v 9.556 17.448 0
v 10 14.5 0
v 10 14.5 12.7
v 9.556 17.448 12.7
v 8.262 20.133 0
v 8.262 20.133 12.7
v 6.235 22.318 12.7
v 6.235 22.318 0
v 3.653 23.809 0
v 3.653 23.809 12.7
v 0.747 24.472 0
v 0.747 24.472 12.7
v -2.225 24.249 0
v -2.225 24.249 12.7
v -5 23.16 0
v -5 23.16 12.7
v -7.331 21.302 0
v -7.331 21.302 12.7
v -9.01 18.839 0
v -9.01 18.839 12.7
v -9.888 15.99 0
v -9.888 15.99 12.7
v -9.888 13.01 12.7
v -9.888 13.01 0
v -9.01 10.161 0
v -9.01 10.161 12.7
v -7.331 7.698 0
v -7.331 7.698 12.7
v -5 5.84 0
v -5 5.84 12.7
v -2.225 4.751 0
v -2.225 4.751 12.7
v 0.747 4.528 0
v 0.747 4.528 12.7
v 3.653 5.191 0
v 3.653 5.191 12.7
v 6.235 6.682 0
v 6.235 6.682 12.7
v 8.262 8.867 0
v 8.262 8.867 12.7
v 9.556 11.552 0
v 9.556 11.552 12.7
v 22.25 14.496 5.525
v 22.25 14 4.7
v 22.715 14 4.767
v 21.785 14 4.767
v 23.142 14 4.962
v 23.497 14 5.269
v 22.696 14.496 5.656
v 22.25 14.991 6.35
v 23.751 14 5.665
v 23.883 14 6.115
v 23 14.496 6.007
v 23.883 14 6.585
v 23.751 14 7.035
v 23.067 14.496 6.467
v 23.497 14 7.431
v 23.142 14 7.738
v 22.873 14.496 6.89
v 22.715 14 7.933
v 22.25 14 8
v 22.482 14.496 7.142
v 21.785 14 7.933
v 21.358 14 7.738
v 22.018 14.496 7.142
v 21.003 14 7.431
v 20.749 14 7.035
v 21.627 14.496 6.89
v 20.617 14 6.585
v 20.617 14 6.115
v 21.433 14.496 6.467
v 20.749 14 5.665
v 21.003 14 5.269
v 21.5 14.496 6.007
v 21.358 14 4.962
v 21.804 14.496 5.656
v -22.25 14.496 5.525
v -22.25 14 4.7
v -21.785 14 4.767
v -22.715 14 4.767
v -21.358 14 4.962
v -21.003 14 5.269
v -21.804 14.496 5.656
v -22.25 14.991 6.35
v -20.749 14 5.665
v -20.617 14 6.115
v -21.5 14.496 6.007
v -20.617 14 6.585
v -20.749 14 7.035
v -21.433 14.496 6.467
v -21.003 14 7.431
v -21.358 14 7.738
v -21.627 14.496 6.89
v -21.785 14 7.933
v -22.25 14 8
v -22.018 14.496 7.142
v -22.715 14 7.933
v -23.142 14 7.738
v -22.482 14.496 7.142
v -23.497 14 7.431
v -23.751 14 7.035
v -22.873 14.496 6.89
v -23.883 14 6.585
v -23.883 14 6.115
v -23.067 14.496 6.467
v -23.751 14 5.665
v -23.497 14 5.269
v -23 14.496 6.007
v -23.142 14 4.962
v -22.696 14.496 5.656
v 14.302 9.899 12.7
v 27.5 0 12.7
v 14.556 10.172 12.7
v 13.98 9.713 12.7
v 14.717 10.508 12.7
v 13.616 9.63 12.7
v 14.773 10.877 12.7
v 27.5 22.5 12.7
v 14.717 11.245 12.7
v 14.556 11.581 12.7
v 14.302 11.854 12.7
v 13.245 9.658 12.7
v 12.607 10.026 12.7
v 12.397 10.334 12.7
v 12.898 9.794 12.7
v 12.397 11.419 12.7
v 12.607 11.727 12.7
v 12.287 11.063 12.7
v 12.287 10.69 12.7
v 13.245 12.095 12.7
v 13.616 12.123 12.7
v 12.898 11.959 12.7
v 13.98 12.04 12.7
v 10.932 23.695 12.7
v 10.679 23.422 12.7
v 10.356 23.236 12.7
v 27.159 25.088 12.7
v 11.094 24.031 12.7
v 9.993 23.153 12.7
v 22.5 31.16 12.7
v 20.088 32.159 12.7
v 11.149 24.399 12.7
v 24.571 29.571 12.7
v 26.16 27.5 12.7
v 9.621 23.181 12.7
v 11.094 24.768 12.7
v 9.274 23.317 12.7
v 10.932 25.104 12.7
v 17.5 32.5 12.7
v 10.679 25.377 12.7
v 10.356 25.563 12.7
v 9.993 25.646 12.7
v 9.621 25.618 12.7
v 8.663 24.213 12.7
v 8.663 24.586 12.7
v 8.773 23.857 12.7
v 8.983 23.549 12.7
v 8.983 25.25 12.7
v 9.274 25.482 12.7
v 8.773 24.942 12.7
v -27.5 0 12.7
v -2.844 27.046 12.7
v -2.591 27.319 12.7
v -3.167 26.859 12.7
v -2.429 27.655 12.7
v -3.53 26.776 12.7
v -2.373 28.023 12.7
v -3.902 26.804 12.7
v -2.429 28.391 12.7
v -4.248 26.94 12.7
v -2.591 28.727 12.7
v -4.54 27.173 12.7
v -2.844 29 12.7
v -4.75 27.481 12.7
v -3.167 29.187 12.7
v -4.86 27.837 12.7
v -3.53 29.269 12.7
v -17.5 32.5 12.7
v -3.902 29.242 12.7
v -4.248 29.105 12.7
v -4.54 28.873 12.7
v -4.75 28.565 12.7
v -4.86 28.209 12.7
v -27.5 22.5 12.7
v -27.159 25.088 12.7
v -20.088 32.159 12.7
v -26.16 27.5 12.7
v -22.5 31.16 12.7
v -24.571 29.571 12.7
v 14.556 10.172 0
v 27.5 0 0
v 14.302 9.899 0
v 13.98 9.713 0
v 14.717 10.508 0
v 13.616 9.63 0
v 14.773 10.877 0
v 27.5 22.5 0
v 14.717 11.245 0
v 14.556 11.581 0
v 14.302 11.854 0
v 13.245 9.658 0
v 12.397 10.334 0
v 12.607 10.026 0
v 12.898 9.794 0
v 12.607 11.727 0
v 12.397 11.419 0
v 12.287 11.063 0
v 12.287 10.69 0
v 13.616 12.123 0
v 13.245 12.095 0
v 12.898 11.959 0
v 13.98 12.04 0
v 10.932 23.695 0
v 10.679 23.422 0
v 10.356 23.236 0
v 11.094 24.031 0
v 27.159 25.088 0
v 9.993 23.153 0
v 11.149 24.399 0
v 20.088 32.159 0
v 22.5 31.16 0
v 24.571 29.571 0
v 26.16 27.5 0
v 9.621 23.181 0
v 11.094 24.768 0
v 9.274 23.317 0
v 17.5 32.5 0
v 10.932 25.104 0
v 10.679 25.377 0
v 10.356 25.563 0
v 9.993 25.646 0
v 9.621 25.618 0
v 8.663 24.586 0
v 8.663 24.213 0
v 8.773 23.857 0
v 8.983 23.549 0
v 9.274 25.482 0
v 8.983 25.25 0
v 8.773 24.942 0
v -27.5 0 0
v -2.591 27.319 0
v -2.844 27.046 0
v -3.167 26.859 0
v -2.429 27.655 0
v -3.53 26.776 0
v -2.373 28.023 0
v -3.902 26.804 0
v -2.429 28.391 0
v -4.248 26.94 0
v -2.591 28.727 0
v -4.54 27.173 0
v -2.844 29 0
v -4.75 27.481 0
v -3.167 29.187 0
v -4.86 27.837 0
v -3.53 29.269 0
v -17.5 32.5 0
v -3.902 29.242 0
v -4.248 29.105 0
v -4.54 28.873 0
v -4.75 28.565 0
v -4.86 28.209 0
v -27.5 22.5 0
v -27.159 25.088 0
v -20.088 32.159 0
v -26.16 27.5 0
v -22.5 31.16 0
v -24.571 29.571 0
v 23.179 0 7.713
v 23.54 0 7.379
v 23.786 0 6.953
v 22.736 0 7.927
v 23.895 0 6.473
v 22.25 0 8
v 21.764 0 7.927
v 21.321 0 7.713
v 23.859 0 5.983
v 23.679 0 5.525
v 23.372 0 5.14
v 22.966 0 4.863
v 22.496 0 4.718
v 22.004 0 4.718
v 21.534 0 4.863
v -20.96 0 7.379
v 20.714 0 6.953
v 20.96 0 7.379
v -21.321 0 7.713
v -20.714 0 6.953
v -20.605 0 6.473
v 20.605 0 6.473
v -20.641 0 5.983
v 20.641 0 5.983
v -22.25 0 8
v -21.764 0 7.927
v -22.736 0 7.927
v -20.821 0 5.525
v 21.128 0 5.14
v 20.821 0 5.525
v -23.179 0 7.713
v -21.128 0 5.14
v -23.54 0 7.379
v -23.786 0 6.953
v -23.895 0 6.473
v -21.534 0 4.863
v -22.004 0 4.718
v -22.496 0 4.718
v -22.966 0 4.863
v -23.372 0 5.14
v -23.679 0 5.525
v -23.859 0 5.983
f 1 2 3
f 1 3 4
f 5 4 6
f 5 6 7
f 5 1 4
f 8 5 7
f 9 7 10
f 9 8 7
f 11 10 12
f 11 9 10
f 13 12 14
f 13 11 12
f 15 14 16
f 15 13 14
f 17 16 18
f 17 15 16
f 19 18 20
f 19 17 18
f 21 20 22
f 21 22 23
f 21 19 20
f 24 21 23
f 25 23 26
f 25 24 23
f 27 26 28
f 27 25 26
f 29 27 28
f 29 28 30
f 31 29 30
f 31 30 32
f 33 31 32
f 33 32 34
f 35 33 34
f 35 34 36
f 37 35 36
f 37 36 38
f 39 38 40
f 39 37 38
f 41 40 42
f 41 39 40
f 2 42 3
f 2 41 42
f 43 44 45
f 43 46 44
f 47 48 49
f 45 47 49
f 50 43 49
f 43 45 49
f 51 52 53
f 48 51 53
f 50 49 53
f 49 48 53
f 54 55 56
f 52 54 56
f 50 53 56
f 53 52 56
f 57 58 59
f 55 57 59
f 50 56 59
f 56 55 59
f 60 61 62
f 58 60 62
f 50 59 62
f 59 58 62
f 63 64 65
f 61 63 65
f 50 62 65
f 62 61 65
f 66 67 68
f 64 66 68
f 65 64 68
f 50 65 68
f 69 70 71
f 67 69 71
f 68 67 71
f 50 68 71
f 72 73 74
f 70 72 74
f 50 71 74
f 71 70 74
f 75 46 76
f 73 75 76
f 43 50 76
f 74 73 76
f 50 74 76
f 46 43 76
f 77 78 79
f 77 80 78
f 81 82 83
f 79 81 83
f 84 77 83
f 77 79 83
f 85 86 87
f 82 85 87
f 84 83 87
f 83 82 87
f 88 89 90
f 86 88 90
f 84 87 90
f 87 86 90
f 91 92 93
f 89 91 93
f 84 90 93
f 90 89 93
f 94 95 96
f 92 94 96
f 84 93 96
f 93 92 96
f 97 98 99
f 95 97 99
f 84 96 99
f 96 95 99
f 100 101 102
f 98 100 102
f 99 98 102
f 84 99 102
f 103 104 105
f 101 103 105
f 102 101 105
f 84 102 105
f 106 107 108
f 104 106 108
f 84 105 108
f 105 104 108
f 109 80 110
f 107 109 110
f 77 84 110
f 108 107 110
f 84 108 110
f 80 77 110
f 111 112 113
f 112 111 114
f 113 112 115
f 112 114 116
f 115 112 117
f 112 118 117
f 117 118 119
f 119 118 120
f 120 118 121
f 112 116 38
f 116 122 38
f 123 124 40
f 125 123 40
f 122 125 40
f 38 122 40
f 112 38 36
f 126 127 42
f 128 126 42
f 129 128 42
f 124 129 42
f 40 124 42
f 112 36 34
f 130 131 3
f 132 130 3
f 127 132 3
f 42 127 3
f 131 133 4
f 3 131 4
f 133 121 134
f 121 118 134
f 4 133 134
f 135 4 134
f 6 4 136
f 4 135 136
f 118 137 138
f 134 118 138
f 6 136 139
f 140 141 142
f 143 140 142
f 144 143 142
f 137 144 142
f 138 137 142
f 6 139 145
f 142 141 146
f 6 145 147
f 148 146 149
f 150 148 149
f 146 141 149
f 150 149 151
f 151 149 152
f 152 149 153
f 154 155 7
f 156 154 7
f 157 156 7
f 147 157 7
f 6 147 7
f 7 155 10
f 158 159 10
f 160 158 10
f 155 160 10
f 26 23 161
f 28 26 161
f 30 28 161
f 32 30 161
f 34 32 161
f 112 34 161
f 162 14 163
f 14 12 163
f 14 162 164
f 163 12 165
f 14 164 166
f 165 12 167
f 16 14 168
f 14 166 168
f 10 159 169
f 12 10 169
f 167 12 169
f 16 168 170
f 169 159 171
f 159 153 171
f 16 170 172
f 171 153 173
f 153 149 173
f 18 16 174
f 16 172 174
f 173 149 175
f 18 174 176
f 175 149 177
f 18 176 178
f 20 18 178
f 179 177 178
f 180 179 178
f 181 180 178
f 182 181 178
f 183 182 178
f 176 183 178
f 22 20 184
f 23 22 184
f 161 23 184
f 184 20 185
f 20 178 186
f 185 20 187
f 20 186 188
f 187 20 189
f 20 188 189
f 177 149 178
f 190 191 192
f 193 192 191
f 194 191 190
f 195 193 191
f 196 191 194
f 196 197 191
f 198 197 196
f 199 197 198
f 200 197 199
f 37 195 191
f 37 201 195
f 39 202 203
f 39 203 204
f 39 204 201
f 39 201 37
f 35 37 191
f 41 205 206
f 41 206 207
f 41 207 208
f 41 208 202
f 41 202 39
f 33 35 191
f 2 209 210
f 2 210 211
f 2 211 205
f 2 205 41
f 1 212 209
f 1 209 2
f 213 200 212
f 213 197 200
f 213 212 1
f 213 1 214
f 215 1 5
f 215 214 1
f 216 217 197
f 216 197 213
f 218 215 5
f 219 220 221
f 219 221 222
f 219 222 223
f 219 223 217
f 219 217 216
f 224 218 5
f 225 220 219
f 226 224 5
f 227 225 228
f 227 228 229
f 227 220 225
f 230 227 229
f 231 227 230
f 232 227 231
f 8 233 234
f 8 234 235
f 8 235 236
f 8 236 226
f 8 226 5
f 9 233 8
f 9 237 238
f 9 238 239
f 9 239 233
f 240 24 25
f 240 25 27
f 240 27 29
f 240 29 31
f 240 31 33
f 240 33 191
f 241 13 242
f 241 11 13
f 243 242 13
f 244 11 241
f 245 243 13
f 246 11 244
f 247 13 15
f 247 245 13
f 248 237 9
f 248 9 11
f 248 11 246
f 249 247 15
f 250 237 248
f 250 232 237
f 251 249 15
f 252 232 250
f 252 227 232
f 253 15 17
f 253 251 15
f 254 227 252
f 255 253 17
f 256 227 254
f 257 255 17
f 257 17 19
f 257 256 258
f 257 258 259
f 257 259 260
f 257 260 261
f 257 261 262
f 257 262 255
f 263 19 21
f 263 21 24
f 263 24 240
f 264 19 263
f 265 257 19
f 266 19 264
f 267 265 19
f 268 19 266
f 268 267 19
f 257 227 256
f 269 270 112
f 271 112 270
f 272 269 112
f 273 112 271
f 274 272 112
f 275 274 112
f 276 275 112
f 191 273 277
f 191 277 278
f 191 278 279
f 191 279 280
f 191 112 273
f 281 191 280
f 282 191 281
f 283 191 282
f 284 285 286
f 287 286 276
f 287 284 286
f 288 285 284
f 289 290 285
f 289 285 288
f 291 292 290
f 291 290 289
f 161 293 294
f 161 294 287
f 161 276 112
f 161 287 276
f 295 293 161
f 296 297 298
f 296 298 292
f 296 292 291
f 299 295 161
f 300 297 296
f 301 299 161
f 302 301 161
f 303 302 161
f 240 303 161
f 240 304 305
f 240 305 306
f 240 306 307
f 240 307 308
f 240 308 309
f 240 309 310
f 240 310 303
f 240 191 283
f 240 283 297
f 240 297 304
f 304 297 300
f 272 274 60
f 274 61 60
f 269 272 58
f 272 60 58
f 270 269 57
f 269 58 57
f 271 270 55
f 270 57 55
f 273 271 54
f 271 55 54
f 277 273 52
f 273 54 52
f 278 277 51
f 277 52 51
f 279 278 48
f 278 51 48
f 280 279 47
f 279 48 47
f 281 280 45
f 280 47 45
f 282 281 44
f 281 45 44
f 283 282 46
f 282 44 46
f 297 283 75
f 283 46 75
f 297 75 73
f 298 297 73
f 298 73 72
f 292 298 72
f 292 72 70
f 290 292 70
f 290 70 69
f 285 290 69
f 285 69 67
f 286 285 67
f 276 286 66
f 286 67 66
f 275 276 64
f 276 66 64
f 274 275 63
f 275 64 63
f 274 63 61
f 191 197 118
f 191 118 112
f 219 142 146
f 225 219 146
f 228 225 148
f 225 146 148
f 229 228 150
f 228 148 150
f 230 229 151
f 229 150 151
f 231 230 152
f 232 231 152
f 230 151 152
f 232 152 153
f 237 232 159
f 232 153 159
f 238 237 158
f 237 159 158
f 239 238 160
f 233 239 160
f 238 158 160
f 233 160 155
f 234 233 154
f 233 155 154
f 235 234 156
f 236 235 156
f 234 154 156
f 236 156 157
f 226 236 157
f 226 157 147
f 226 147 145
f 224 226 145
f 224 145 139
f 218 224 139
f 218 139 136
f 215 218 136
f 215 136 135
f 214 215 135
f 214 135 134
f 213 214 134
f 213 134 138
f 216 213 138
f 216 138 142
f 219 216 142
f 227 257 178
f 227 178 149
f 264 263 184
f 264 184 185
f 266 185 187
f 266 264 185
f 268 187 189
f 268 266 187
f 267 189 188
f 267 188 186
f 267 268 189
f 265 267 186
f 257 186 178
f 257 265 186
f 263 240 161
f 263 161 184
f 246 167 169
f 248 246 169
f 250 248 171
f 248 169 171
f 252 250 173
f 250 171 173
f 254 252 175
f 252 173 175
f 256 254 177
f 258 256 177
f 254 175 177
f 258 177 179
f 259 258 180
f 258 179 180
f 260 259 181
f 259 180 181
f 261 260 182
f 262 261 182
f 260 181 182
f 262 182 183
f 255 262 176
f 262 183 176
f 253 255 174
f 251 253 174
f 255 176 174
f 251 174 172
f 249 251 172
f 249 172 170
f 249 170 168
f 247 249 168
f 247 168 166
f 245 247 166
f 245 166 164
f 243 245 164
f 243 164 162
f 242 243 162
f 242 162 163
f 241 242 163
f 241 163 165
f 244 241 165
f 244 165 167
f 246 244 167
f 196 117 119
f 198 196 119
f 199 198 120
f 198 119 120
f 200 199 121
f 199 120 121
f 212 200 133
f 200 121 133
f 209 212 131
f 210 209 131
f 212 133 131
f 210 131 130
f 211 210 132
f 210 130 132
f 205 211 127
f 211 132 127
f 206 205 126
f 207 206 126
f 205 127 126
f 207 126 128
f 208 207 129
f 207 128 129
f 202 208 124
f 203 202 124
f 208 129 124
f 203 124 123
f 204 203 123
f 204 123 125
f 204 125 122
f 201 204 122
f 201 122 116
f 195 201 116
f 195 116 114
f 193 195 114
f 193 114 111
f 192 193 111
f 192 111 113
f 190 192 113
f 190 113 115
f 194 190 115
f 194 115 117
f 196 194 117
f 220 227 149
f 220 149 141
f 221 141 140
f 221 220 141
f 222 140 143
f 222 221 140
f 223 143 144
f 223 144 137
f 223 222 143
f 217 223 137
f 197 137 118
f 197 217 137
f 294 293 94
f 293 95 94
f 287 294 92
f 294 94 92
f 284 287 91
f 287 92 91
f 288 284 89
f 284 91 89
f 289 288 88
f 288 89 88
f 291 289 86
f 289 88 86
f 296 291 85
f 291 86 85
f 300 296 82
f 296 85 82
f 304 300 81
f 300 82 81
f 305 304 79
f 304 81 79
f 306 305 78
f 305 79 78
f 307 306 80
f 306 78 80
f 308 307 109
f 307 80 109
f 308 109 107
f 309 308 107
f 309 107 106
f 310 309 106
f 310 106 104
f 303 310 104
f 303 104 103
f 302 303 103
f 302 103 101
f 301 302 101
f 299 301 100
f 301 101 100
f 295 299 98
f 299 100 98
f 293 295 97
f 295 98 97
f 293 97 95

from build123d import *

# Parameters (mm, degrees)
SKETCH2_R                       = 10
BOSS_EXTRUDE1_DEPTH             = 12.7
TAP_DRILL_FOR_M3X0_5_TAP1_D     = 2.5
TAP_DRILL_FOR_M3X0_5_TAP1_DEPTH = 25
TAP_DRILL_FOR_M3X0_5_TAP1_TIP   = 0.751075774
M4X0_7_TAPPED_HOLE1_D           = 3.3
M4X0_7_TAPPED_HOLE1_DEPTH       = 14
M4X0_7_TAPPED_HOLE1_TIP         = 0.991420021


with BuildPart() as part:
    # Sketch2 → Boss-Extrude1 (new body)
    with BuildSketch(Plane.XY):
        with BuildLine():
            Line((27.5, 0), (-27.5, 0))
            Line((-27.5, 0), (-27.5, 22.5))
            ThreePointArc((-27.5, 22.5), (-24.571067812, 29.571067812), (-17.5, 32.5))
            Line((-17.5, 32.5), (17.5, 32.5))
            ThreePointArc((17.5, 32.5), (24.571067812, 29.571067812), (27.5, 22.5))
            Line((27.5, 22.5), (27.5, 0))
        make_face()
        with Locations((0, 14.5)):
            Circle(SKETCH2_R, mode=Mode.SUBTRACT)
    extrude(amount=BOSS_EXTRUDE1_DEPTH)

    # Tap Drill for M3x0.5 Tap1
    with Locations(Plane(origin=(13.522961568, 10.876533369, 0), x_dir=(-1, 0, 0), z_dir=(0, 0, -1))):
        with Locations((0, 0), (3.623466631, 13.522961568), (17.146428199, 17.146428199)):
            Hole(TAP_DRILL_FOR_M3X0_5_TAP1_D / 2, depth=TAP_DRILL_FOR_M3X0_5_TAP1_DEPTH)
            with Locations((0, 0, -(TAP_DRILL_FOR_M3X0_5_TAP1_DEPTH + TAP_DRILL_FOR_M3X0_5_TAP1_TIP / 2))):  # 118° drill point
                Cone(0, TAP_DRILL_FOR_M3X0_5_TAP1_D / 2, TAP_DRILL_FOR_M3X0_5_TAP1_TIP, mode=Mode.SUBTRACT)

    # M4x0.7 Tapped Hole1
    with Locations(Plane(origin=(22.25, 0, 6.35), x_dir=(0, 0, -1), z_dir=(0, -1, 0))):
        with Locations((0, 0), (0, -44.5)):
            Hole(M4X0_7_TAPPED_HOLE1_D / 2, depth=M4X0_7_TAPPED_HOLE1_DEPTH)
            with Locations((0, 0, -(M4X0_7_TAPPED_HOLE1_DEPTH + M4X0_7_TAPPED_HOLE1_TIP / 2))):  # 118° drill point
                Cone(0, M4X0_7_TAPPED_HOLE1_D / 2, M4X0_7_TAPPED_HOLE1_TIP, mode=Mode.SUBTRACT)


solid = part.part
